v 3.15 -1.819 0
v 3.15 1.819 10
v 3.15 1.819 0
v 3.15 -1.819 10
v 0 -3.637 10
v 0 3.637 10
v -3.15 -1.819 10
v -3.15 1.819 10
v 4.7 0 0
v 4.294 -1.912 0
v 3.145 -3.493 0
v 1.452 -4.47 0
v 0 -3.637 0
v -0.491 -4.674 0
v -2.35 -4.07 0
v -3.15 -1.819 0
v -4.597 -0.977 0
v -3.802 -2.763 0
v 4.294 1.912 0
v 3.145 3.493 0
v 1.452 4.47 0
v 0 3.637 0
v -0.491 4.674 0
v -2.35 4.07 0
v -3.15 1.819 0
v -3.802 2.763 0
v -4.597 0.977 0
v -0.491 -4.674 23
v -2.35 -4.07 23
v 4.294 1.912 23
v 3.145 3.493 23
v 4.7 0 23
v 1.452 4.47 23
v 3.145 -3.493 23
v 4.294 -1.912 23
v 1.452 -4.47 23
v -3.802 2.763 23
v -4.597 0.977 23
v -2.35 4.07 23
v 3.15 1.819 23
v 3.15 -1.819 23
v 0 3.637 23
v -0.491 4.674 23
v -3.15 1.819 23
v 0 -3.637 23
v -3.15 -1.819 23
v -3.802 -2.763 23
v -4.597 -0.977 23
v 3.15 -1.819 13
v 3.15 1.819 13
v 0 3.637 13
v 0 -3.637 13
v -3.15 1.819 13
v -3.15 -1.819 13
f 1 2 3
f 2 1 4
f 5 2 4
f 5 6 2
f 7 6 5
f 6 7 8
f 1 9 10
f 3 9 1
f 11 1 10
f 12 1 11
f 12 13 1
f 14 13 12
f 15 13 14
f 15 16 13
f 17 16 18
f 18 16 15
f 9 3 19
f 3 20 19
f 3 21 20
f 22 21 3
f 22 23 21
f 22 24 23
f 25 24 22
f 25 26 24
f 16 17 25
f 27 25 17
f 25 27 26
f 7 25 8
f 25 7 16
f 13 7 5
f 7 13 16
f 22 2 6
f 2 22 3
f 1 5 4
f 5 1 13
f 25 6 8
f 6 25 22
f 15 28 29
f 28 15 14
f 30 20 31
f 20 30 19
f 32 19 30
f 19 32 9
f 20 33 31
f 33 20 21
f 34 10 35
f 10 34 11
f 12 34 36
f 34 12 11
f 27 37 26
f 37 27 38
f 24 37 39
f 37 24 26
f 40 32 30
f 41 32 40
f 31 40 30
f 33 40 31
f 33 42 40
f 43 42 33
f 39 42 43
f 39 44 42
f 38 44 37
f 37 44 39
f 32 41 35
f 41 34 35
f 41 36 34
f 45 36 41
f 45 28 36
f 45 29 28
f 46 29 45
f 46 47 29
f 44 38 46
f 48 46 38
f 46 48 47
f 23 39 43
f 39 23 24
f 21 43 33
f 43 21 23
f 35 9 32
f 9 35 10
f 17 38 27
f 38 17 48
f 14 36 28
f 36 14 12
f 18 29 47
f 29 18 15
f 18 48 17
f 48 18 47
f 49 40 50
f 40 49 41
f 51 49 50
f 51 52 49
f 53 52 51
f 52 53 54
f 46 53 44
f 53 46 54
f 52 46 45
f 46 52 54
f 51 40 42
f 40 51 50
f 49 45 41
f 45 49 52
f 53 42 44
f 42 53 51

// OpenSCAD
/* [Adapter Type] */
type=2; // [1:pin+hole,2:hole+hole]
/* [Adapter shape] */
//exterior of the adapter
form=1; // [1:cylinder,2:hexagon]
/* [Bit size] */
// size of the bit in mm
size=6.2;
// Deep of the hole for the bit in mm
deep=10;
/* [Joint parameters] */
//how much to add to bit size for external diameter of extender (teoretically affect the hardeness, of course the print setting also important)
diameter=3; // [1:1mm,2:2mm,3:3mm,4:4mm,5:5mm, 6:6mm]
// distance (in mm.) between two bit's holes inside the adapter. May be used to get long adapter. Full adapter height=deep*2+distance
distance=3;
/* [Material properties] */
// Shrinkage is differ for materials. Size of holes will be increased forthis value. Try  the default, correct if too tight.
shrinkage=0.1;

if (distance<2) {
    distance=2;
    };

radius=(diameter+size)/2;
    
if (type==2){
difference(){
difference(){
if (form==1){
cylinder(deep*2+distance,r=radius+shrinkage,center=false);
}else{
    Hexagone(radius*2,deep*2+distance);
};
Hexagone(size+shrinkage,deep);
    };
translate([0,0,deep+distance]) {Hexagone(size+shrinkage,deep);
    };
};
} else {
difference(){
if (form==1) {
    cylinder(deep+distance,r=radius+shrinkage,center=false);
} else {
    Hexagone(radius*2,deep+distance);
};
Hexagone(size+shrinkage,deep);
};
translate([0,0,deep+distance]) {Hexagone(size-shrinkage,deep);
    };
};
function cot(x)=1/tan(x);
module Hexagone(size,height)
{
	angle = 60;		
	width = size * cot(angle);

    translate([0,0,height/2]){

	union()
	{
		rotate([0,0,0])
			cube([size,width,height],center=true);
		rotate([0,0,angle])
			cube([size,width,height],center=true);
		rotate([0,0,2*angle])
			cube([size,width,height],center=true);
	}
};
}
